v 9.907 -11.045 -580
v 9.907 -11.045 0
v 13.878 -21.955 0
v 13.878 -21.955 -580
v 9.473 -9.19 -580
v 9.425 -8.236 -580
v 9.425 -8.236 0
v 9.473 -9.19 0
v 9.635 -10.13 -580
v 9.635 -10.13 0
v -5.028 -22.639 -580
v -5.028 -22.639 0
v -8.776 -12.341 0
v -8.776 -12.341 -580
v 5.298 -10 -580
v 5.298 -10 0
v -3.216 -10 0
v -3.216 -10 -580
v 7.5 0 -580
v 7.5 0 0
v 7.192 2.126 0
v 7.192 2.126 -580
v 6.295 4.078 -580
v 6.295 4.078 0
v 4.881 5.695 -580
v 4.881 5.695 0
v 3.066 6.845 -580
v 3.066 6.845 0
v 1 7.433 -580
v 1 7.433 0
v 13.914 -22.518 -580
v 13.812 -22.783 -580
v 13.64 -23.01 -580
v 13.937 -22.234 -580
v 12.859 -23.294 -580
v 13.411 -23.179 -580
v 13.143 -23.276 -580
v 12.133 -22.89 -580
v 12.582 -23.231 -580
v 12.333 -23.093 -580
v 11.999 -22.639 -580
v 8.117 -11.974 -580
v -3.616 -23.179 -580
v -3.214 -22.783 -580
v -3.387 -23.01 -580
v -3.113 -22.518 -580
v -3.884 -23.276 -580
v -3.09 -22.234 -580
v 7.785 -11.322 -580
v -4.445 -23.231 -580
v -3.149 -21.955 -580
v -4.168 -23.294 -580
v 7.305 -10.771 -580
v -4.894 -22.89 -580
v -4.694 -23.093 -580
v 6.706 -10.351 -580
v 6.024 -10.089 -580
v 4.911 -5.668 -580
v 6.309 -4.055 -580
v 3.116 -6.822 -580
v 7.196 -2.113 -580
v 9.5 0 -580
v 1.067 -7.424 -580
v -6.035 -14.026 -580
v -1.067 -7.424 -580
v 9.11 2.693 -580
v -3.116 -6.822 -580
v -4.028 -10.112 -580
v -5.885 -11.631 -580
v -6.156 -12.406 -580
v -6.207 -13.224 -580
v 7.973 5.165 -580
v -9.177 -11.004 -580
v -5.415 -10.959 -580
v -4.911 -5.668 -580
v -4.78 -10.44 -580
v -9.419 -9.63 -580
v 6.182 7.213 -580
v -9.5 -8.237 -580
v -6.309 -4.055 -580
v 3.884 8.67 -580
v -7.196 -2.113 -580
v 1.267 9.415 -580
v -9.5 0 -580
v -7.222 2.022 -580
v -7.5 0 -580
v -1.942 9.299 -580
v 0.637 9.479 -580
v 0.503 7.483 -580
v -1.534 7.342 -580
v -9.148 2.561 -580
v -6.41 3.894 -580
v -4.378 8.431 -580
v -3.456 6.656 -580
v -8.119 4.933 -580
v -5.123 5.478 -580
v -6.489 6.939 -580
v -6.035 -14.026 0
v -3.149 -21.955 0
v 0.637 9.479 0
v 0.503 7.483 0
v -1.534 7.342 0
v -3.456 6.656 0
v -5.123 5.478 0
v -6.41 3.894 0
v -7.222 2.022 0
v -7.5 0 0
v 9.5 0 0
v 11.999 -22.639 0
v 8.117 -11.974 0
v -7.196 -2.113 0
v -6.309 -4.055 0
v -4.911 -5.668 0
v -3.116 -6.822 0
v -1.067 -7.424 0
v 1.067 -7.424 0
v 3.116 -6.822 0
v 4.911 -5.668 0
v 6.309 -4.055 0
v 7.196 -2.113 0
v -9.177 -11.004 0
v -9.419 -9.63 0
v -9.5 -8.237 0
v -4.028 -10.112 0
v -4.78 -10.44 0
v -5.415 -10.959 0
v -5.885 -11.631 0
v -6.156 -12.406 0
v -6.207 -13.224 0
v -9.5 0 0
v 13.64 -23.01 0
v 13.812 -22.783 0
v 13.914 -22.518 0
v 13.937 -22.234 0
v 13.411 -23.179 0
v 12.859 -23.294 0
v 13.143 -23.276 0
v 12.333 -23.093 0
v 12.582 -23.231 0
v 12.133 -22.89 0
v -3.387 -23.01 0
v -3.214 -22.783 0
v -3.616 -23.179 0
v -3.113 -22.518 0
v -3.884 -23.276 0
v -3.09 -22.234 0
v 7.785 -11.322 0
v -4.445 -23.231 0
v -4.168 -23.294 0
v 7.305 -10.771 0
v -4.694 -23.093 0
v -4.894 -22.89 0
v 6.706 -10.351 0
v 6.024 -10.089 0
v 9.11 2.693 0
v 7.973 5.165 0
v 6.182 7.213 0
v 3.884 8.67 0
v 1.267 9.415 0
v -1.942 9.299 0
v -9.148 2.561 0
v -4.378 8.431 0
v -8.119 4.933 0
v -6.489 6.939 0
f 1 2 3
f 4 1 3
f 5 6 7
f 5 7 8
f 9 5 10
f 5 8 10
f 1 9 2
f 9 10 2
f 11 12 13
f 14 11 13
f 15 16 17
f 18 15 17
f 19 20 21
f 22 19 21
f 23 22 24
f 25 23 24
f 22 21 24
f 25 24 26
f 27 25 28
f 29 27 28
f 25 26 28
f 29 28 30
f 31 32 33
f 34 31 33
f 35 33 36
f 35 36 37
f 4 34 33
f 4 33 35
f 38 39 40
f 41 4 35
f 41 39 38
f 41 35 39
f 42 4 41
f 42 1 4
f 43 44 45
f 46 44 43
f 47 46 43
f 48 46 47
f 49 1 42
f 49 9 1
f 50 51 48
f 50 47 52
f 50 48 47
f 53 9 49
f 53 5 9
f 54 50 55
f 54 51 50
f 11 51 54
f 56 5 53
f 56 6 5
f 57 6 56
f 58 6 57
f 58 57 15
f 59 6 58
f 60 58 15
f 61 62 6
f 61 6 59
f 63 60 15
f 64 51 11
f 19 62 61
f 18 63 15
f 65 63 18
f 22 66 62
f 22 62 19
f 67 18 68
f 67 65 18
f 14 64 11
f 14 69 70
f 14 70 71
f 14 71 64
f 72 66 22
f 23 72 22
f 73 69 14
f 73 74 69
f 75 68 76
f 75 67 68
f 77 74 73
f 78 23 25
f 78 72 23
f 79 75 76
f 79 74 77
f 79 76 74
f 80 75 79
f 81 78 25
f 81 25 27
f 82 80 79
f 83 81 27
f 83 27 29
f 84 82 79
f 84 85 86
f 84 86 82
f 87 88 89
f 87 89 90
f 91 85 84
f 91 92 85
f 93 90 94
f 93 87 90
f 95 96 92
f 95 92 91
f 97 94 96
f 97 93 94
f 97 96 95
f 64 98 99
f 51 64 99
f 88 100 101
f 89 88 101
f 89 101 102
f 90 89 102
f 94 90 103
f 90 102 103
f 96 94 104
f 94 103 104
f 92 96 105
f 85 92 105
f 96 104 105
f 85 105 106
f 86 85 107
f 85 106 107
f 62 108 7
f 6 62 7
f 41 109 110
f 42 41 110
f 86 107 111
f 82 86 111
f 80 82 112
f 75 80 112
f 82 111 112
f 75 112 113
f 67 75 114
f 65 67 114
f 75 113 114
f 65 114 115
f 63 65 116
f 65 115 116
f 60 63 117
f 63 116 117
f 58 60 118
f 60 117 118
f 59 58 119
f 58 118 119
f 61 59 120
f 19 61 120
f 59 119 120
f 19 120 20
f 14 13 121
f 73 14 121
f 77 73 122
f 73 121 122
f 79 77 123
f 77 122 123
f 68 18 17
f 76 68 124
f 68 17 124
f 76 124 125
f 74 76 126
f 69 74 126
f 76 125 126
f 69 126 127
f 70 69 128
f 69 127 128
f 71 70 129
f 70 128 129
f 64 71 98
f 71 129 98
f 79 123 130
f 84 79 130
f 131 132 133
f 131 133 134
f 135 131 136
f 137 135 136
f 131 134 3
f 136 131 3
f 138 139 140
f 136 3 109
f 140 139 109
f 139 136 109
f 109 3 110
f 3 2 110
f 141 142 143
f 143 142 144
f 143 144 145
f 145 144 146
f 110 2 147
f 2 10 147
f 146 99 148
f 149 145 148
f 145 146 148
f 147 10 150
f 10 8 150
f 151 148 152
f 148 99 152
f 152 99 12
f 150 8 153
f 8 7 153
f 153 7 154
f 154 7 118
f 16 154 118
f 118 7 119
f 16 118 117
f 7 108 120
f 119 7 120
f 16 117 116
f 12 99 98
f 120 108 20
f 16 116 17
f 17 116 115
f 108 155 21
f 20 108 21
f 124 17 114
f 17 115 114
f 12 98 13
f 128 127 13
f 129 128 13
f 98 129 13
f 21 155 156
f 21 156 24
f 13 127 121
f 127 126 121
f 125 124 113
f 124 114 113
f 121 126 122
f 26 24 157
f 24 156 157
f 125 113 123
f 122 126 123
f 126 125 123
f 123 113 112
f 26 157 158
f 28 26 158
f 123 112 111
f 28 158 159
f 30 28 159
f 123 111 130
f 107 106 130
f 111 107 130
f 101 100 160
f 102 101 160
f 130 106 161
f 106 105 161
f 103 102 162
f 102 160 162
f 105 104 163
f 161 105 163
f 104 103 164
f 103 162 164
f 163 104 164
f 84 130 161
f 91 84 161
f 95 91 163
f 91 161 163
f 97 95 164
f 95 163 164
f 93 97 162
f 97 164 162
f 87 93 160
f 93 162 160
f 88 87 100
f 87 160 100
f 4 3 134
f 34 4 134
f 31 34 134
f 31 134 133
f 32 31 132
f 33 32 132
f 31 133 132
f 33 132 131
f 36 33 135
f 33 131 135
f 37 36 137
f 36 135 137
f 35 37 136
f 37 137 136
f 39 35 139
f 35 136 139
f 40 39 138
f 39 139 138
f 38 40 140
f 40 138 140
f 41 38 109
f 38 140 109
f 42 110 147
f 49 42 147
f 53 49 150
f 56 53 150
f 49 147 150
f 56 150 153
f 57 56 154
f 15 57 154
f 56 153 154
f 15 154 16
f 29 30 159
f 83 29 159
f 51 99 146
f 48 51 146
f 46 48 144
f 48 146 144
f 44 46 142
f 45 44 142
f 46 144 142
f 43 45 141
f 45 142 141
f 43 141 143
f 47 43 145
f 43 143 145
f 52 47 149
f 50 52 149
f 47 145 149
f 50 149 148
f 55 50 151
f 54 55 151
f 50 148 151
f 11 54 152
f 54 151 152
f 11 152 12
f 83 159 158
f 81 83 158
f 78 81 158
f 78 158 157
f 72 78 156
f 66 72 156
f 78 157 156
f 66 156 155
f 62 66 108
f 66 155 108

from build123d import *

# Parameters (mm, degrees)
BOSS_EXTRUDE1_DEPTH = 580


with BuildPart() as part:
    # Sketch3 → Boss-Extrude1 (new body)
    with BuildSketch(Plane.XY):
        with BuildLine():
            Line((-6.034633842, -14.02606043), (-3.148633912, -21.955280071))
            ThreePointArc((-3.148633912, -21.955280071), (-3.746306389, -23.236992835), (-5.028019153, -22.639320358))
            Line((-5.028019153, -22.639320358), (-8.776311449, -12.340971913))
            ThreePointArc((-8.776311449, -12.340971913), (-9.317693036, -10.320508325), (-9.5, -8.236730193))
            Line((-9.5, -8.236730193), (-9.5, 0))
            ThreePointArc((-9.5, 0), (-6.488568374, 6.93891061), (0.636522201, 9.478651776))
            Line((0.636522201, 9.478651776), (0.502517527, 7.483146139))
            ThreePointArc((0.502517527, 7.483146139), (-5.12255398, 5.478087324), (-7.5, 0))
            ThreePointArc((-7.5, 0), (0, -7.5), (7.5, 0))
            ThreePointArc((7.5, 0), (5.645794895, 4.937104415), (1, 7.433034374))
            Line((1, 7.433034374), (1.266666667, 9.415176873))
            ThreePointArc((1.266666667, 9.415176873), (7.151340201, 6.253665592), (9.5, 0))
            Line((9.5, 0), (9.425154073, -8.236390129))
            ThreePointArc((9.425154073, -8.236390129), (9.540131353, -9.662460438), (9.907282817, -11.045246071))
            Line((9.907282817, -11.045246071), (13.878210448, -21.955280071))
            ThreePointArc((13.878210448, -21.955280071), (13.28053797, -23.236992835), (11.998825206, -22.639320358))
            Line((11.998825206, -22.639320358), (8.116944062, -11.97393957))
            ThreePointArc((8.116944062, -11.97393957), (7.018595509, -10.542543867), (5.2978662, -10))
            Line((5.2978662, -10), (-3.21555598, -10))
            ThreePointArc((-3.21555598, -10), (-5.673012113, -11.279270691), (-6.034633842, -14.02606043))
        make_face()
    extrude(amount=-BOSS_EXTRUDE1_DEPTH)


solid = part.part
